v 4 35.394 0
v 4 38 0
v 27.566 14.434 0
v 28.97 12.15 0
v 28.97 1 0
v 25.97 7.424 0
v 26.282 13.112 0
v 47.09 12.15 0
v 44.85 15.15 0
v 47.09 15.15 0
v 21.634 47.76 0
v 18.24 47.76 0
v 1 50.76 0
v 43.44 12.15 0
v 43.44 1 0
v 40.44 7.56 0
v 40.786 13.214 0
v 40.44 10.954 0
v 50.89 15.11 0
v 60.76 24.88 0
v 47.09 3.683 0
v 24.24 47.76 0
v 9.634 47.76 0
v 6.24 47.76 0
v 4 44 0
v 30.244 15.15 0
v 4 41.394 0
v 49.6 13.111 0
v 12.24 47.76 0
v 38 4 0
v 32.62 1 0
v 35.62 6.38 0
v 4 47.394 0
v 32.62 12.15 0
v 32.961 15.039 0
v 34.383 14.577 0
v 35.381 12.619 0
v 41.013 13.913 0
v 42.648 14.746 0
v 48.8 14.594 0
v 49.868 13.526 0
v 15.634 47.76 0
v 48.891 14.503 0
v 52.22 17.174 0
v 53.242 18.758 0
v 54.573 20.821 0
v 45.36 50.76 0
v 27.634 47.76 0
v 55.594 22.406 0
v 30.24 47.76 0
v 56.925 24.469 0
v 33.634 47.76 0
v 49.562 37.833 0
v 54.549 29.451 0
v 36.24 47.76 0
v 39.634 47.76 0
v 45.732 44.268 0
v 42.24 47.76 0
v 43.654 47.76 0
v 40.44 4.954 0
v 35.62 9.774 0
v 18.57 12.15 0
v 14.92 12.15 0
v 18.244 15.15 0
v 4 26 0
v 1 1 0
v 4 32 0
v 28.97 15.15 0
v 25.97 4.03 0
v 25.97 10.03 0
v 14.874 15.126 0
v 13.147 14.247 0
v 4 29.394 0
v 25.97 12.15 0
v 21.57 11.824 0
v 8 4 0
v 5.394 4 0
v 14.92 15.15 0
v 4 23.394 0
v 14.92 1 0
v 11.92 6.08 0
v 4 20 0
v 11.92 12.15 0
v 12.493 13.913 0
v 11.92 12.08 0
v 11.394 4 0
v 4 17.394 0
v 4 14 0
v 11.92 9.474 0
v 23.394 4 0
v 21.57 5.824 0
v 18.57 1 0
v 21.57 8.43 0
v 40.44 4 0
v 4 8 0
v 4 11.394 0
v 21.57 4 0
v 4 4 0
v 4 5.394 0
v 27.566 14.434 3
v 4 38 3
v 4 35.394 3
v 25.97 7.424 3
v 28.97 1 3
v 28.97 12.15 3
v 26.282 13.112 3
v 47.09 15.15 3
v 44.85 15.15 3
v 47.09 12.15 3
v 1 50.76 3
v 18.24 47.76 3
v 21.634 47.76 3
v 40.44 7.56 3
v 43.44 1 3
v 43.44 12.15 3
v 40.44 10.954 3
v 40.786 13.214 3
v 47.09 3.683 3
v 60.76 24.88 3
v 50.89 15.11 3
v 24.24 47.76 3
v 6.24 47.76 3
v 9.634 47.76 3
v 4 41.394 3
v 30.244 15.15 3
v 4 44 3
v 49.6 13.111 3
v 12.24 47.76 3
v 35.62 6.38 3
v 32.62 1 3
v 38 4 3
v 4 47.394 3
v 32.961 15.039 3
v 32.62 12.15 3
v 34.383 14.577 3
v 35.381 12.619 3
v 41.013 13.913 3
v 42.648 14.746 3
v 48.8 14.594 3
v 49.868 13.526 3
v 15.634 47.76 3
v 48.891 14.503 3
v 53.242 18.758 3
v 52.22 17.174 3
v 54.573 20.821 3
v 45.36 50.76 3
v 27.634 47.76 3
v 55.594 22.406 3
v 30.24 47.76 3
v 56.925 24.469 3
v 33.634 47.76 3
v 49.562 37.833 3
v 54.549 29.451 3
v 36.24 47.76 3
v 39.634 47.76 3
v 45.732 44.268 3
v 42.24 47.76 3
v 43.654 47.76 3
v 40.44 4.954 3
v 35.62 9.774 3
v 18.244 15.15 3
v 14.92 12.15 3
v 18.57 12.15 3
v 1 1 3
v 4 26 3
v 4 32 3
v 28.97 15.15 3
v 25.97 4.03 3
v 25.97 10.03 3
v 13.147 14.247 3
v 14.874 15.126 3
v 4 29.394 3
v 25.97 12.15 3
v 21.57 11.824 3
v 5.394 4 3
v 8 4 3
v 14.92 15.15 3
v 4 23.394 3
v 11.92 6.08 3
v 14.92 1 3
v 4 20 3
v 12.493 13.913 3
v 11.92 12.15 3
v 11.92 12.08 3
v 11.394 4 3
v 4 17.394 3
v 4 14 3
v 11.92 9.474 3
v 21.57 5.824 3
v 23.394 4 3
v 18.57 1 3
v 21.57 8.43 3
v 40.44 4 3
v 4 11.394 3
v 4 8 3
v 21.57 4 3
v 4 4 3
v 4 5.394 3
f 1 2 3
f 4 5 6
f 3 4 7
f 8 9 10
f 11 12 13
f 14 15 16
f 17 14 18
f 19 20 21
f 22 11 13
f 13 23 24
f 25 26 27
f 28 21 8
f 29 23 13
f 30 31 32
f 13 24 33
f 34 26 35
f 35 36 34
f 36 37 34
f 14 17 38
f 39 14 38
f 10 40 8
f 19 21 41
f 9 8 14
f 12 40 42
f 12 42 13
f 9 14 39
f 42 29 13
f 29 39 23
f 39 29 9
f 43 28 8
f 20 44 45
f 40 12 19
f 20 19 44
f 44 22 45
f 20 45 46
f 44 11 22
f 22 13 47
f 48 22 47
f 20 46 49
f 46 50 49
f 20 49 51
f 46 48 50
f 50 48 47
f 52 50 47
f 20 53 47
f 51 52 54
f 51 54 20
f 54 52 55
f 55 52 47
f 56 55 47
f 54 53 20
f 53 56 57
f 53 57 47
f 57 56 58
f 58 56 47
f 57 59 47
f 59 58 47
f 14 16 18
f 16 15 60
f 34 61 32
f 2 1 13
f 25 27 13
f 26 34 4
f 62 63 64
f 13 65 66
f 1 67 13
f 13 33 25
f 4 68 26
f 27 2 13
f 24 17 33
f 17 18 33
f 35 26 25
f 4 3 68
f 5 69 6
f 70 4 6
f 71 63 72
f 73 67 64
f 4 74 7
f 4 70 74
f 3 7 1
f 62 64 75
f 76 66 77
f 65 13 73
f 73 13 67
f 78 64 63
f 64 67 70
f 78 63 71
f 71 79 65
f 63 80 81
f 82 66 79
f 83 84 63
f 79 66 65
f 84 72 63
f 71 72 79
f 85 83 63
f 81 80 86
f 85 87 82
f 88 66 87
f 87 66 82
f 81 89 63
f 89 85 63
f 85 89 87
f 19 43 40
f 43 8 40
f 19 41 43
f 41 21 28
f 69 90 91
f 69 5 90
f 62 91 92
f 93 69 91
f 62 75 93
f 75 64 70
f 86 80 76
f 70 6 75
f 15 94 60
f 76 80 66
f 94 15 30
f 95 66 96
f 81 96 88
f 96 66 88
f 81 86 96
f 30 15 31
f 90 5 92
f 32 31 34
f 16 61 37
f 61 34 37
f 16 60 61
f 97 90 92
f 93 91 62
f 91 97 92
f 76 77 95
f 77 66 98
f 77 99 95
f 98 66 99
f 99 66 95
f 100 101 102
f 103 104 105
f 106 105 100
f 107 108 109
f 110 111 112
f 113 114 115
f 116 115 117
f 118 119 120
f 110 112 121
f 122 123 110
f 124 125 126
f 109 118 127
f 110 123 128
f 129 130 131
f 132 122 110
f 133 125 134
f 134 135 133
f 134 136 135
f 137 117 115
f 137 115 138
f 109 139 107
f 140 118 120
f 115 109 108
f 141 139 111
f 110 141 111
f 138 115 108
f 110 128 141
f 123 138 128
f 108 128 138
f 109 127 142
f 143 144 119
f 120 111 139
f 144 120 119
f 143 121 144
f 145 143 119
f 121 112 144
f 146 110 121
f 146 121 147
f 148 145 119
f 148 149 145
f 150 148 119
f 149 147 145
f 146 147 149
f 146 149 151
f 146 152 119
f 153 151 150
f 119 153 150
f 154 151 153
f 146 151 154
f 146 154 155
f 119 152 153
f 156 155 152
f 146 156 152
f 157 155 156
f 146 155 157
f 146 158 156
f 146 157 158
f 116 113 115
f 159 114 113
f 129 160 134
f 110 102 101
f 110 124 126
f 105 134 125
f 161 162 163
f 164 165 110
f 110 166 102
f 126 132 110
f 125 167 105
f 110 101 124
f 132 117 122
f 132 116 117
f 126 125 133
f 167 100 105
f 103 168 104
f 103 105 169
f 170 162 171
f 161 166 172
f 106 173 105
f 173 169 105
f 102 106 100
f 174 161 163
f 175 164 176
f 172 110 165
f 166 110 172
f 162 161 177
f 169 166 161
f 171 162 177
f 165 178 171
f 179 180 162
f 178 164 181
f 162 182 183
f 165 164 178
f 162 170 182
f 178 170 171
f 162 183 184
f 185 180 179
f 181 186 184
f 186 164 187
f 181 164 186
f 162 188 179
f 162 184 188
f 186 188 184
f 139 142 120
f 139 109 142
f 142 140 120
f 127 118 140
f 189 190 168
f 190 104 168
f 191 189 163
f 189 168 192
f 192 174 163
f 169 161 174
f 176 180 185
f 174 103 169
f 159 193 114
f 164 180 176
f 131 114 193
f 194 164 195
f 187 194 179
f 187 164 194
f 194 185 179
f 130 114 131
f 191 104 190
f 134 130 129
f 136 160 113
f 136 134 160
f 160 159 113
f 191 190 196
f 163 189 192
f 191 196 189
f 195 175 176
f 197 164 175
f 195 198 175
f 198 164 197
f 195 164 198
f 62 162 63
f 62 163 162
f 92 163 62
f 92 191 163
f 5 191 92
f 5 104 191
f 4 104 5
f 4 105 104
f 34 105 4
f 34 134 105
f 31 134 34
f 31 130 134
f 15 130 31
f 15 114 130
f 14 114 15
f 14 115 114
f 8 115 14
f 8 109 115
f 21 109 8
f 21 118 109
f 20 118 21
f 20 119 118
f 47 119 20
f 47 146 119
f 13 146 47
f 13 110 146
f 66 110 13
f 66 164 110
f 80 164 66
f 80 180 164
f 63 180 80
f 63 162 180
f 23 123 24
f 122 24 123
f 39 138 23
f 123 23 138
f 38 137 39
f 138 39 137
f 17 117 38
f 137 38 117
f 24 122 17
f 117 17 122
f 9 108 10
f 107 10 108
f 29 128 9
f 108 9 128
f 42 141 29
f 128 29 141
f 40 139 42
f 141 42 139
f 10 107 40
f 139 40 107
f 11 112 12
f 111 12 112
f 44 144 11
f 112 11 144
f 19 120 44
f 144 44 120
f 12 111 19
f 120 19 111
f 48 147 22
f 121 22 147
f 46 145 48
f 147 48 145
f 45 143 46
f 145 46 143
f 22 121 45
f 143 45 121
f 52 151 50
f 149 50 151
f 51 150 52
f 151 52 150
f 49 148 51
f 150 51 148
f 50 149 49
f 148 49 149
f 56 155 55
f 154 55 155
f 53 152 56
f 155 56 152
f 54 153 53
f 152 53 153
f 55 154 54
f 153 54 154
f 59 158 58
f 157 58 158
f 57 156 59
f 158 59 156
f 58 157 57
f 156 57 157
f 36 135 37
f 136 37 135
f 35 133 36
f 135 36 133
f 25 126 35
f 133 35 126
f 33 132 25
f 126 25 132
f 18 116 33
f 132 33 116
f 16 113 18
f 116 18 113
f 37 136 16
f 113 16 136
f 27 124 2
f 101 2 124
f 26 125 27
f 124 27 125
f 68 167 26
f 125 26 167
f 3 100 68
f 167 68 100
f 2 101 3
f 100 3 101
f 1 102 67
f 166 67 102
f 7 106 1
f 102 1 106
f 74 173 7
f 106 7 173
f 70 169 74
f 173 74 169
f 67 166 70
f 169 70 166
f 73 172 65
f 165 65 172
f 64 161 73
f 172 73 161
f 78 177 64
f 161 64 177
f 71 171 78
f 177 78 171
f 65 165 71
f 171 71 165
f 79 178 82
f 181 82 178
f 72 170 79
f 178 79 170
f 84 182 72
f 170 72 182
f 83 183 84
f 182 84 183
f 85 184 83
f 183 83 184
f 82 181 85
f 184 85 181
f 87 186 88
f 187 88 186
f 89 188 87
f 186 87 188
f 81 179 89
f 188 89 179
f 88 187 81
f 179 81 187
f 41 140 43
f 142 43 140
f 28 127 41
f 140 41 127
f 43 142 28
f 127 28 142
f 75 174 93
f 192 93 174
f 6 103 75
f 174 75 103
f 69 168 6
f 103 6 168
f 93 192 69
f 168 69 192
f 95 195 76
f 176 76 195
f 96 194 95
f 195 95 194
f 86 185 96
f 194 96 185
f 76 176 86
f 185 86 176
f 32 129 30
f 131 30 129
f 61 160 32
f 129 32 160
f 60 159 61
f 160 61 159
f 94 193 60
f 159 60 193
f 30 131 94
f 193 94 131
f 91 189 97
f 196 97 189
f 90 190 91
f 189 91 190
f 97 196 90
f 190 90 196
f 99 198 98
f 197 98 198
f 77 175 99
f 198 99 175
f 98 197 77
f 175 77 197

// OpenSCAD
/**
 * A catcher for chopsticks for our dishwasher.
 *
 * All measurements are in millimeters.
 *
 * Parameters:
 *   - thickness: Vertical thickness.
 *   - padding: Padding of outer edge.
 *   - slat_size: Size of slats.
 *   - short_length: Short length.
 *   - long_length: Long length.
 *   - height: Height.
 *   - first_indent: Start of first indent.
 *   - second_indent: Start of second indent.
 *   - third_indent: Start of third indent.
 *   - indent_width: Width of indents.
 *   - indent_height: Height of indents.
 */

thickness = 3;
padding = 1;
slat_size = 3;

short_length = 46.36;
long_length = 61.76;
height = 51.76;

first_indent = 15.92;
second_indent = 29.97;
third_indent = 44.44;

indent_width = 1.65;
indent_height = 11.15;

module base() {
    difference() {
        polygon([
            [padding, padding],
            [short_length - padding, padding],
            [long_length - padding, (height / 2) - padding],
            [short_length - padding, height - padding],
            [padding, height - padding],
        ]);
        translate([first_indent - padding, padding])
            square([indent_width + (padding * 2), indent_height]);
        translate([second_indent - padding, padding])
            square([indent_width + (padding * 2), indent_height]);
        translate([third_indent - padding, padding])
            square([indent_width + (padding * 2), indent_height]);
    }
}

linear_extrude(thickness) {
    difference() {
        base();
        intersection() {
            offset(r = -slat_size)
                base();
            for (i = [0 : 2 : 100])
                translate([i * slat_size, 0])
                    rotate([0, 0, 45])
                        square([slat_size * 0.8, long_length * 2]);
        }
    }
}
